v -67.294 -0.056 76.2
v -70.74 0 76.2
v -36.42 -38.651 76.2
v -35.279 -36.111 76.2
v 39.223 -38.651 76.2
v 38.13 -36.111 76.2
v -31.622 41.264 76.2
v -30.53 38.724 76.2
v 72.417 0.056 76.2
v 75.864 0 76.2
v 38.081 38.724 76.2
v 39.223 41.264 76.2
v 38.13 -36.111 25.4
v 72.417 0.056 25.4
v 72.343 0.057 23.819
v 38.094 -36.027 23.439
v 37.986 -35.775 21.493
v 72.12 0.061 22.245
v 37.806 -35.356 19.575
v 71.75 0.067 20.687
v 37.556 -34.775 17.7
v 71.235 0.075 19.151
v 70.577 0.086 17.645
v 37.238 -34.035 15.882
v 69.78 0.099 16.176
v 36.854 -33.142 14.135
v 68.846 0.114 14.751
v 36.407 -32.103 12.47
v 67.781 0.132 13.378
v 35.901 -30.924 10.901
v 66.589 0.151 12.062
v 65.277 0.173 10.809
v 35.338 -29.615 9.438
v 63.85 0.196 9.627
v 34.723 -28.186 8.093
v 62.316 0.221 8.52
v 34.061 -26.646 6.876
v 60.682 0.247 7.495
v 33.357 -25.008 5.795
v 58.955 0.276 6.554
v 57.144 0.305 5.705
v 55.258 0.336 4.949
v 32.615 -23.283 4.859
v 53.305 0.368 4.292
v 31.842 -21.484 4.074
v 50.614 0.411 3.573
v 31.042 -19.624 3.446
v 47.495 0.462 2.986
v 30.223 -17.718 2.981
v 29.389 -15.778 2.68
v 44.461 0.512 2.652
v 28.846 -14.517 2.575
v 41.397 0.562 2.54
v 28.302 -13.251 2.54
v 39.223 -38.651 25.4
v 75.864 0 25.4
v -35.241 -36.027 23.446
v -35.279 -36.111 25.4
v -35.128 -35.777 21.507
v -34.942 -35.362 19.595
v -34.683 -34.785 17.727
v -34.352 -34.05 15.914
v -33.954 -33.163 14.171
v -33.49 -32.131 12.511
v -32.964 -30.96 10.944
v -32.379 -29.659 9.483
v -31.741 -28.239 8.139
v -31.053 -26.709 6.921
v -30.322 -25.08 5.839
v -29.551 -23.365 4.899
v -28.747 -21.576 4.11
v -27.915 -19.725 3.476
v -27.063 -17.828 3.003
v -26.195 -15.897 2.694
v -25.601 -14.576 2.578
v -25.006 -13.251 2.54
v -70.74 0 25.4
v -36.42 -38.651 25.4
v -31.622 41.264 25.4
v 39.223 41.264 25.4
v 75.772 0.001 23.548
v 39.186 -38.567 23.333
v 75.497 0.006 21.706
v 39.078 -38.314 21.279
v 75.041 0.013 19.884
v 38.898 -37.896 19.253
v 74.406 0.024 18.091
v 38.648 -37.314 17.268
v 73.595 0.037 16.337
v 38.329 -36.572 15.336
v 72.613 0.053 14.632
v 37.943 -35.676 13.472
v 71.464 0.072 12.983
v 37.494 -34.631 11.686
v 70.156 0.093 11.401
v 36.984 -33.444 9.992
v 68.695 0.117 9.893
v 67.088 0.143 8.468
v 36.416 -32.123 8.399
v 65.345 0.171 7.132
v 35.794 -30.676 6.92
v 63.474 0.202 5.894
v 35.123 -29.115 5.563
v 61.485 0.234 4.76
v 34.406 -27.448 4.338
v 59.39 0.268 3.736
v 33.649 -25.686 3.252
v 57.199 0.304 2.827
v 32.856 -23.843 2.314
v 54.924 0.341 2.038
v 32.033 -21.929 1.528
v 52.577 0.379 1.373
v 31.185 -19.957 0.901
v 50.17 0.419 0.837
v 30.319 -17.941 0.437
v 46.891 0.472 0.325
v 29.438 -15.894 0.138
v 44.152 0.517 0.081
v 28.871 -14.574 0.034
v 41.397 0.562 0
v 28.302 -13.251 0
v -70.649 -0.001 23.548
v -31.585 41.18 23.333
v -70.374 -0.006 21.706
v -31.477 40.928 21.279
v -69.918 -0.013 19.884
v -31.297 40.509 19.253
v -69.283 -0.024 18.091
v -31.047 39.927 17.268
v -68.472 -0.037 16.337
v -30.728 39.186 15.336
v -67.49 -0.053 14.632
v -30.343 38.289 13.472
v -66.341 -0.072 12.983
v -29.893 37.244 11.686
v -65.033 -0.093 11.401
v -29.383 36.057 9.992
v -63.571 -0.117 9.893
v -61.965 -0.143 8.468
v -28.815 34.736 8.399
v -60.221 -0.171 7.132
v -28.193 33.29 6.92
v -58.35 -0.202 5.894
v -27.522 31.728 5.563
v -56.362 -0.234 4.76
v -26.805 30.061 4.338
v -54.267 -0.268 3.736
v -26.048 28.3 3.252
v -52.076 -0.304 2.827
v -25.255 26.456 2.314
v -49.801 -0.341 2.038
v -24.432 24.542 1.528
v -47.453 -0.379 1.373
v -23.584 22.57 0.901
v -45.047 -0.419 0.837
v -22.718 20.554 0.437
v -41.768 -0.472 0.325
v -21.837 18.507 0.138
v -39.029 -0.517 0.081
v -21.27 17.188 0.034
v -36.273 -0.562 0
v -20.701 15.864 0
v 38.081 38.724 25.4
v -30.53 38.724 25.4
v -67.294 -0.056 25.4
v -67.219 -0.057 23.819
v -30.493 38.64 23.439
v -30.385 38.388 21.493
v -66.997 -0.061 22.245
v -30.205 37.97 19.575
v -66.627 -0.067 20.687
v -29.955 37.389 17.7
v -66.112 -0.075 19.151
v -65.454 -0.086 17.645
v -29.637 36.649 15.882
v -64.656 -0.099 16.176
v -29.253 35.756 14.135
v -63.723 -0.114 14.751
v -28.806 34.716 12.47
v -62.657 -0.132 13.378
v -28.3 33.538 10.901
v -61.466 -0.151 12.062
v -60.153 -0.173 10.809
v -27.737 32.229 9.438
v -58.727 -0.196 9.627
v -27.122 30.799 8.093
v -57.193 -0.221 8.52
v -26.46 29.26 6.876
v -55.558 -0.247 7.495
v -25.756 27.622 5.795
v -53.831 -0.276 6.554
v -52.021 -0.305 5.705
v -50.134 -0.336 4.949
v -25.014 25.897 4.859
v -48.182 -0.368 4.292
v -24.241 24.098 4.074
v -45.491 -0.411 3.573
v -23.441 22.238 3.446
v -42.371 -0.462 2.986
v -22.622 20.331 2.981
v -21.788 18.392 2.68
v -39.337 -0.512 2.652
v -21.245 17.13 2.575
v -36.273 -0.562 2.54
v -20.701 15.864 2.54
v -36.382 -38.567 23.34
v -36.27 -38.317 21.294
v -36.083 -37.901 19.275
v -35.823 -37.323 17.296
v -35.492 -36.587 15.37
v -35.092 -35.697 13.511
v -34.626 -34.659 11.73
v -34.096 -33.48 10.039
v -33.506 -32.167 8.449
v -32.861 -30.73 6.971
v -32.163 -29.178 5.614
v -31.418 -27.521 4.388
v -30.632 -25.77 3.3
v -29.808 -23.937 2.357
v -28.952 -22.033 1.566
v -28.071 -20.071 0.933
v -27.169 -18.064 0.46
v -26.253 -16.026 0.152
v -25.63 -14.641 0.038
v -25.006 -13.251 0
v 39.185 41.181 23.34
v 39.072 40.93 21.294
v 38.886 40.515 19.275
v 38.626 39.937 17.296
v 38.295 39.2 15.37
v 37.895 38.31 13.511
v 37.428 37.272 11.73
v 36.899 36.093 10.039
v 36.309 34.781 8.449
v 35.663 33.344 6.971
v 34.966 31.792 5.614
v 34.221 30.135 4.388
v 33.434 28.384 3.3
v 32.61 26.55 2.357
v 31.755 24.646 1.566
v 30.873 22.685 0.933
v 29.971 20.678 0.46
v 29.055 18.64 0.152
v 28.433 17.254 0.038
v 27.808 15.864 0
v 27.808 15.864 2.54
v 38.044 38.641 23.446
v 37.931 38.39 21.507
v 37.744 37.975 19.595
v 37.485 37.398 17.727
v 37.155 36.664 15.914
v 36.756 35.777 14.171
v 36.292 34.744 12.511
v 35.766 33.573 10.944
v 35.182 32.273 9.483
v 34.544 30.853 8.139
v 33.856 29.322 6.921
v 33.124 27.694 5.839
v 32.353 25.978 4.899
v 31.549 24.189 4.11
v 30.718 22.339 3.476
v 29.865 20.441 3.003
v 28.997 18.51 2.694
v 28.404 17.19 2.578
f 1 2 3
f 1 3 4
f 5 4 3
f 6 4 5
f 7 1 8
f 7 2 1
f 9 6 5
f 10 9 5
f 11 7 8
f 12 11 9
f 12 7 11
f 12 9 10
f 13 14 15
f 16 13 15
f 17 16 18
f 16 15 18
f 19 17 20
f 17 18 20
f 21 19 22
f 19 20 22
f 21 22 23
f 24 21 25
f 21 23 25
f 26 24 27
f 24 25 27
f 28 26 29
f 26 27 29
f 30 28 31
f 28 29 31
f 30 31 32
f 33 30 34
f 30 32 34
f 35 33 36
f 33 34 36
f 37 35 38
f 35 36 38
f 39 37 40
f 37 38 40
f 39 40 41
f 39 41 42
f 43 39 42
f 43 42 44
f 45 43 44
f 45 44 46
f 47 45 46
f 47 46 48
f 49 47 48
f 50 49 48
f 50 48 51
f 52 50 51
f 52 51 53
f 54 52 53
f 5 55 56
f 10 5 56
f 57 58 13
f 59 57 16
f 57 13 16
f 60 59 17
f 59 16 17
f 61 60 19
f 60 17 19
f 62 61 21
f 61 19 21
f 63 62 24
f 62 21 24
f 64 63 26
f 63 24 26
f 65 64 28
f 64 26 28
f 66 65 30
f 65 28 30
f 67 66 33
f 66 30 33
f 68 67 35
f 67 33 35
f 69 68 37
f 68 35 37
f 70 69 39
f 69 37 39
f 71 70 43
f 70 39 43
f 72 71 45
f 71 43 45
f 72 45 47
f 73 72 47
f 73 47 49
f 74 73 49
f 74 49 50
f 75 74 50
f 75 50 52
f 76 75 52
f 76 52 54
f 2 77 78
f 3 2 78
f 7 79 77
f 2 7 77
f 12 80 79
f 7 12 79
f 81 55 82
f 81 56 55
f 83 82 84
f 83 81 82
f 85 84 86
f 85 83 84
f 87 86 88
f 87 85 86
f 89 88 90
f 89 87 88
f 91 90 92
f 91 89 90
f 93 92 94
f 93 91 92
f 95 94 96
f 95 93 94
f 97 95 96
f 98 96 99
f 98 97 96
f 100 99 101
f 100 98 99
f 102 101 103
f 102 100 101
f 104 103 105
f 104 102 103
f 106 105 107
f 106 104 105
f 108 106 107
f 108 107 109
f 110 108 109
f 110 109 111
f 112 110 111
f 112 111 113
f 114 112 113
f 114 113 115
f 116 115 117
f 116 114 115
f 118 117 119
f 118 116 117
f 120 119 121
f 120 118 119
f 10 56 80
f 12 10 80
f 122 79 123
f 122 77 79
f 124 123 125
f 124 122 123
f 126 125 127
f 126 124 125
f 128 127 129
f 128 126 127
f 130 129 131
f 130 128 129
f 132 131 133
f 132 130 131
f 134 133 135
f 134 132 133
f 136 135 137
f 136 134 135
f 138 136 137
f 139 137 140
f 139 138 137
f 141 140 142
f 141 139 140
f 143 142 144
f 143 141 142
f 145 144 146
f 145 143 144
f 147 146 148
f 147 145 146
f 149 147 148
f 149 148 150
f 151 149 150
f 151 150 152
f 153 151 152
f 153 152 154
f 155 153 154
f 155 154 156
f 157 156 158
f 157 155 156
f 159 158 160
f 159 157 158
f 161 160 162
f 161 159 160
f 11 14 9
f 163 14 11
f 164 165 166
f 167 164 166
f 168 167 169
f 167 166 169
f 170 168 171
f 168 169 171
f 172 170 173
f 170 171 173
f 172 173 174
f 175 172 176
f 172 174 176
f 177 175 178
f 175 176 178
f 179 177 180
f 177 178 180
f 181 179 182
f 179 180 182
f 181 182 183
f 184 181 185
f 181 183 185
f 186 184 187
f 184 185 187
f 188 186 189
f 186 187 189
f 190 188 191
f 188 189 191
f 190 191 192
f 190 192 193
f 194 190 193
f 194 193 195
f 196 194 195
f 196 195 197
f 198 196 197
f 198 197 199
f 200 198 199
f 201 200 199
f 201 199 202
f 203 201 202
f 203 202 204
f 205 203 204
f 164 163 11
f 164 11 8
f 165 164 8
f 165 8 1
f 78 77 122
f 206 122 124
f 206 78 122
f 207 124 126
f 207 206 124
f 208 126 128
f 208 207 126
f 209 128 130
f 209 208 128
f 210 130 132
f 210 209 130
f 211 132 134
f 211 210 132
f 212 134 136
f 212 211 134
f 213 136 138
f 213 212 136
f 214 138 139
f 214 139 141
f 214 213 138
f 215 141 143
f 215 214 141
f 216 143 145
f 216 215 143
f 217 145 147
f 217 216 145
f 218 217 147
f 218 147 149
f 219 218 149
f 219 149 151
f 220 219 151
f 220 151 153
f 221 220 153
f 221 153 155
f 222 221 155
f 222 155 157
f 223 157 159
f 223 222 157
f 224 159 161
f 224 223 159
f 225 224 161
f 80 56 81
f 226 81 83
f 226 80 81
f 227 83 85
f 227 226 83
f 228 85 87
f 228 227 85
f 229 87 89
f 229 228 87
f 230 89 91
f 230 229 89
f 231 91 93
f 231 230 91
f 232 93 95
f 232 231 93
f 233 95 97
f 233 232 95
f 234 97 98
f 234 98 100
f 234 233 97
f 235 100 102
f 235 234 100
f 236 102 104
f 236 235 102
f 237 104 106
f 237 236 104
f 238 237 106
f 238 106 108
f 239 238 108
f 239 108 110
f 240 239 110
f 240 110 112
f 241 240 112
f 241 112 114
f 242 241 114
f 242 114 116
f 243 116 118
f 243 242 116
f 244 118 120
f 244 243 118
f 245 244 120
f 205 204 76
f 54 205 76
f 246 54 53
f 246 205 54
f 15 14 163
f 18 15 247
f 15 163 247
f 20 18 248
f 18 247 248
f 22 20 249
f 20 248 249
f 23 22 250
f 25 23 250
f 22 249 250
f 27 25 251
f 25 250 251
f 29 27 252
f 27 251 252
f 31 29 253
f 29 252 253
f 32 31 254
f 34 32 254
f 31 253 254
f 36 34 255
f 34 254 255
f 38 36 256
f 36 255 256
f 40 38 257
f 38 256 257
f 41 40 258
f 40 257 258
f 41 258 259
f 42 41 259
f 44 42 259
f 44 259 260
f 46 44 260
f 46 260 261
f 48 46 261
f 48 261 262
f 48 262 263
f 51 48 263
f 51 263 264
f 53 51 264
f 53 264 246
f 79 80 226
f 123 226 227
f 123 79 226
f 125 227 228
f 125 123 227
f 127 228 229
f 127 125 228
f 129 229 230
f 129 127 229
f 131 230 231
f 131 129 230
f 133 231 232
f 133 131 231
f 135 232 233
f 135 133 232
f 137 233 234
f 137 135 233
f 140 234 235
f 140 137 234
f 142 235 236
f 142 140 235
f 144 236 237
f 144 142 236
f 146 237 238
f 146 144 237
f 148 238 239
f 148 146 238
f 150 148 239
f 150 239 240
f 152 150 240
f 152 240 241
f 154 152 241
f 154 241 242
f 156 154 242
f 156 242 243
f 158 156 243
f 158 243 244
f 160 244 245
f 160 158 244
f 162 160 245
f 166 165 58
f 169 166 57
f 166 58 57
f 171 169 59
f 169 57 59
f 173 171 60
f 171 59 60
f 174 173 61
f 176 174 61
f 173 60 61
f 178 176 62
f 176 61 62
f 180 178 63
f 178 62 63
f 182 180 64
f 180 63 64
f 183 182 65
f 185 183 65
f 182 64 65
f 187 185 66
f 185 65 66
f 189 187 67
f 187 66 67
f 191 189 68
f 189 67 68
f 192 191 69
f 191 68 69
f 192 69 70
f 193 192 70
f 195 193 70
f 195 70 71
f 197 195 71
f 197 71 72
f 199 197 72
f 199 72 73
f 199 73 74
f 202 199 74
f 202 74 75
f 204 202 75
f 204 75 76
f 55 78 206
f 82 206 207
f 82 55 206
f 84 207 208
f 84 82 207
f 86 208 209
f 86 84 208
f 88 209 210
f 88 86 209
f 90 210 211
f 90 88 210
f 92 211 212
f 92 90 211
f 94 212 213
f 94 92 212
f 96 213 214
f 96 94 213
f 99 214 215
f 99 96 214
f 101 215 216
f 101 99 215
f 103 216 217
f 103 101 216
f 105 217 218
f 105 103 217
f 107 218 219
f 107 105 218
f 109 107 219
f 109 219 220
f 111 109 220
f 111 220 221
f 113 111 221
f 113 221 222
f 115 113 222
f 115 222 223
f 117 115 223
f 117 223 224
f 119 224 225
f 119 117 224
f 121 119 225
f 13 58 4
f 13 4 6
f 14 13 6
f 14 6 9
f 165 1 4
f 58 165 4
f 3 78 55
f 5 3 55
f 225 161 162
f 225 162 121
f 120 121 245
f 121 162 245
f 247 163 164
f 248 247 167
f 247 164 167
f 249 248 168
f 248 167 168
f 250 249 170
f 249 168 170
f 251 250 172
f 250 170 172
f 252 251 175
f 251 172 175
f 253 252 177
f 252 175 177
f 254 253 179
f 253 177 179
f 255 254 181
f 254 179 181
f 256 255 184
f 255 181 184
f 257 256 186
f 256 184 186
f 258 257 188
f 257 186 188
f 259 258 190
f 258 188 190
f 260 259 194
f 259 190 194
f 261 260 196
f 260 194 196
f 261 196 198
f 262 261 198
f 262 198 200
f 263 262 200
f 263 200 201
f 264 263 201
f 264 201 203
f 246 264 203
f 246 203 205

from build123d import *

# Parameters (mm, degrees)
F1_DEPTH = 76.2
F2_R     = 25.4
F3_T     = -2.54


with BuildPart() as f1:
    # F0 (on Top) → F1 (new body)
    with BuildSketch(Plane.XY):
        Polygon((-31.621649, 41.264485), (-70.740356, 0), (-36.419954, -38.650967), (39.222521, -38.650967), (75.863615, 0), (39.222521, 41.264485), align=None)
    extrude(amount=F1_DEPTH)

    # F2
    f2_edges = [f1.edges().sort_by_distance(p)[0] for p in [
        (3.800436, 41.264485, 0),
        (-51.181002, 20.632243, 0),
        (-53.580155, -19.325484, 0),
        (1.401283, -38.650967, 0),
        (57.543068, -19.325484, 0),
        (57.543068, 20.632243, 0),
    ]]
    fillet(f2_edges, radius=F2_R)

    # F3
    f3_openings = [f1.faces().sort_by_distance(p)[0] for p in [
        (2.587769, 0.870708, 76.2),
    ]]
    offset(amount=F3_T, openings=f3_openings)


solid = f1.part
